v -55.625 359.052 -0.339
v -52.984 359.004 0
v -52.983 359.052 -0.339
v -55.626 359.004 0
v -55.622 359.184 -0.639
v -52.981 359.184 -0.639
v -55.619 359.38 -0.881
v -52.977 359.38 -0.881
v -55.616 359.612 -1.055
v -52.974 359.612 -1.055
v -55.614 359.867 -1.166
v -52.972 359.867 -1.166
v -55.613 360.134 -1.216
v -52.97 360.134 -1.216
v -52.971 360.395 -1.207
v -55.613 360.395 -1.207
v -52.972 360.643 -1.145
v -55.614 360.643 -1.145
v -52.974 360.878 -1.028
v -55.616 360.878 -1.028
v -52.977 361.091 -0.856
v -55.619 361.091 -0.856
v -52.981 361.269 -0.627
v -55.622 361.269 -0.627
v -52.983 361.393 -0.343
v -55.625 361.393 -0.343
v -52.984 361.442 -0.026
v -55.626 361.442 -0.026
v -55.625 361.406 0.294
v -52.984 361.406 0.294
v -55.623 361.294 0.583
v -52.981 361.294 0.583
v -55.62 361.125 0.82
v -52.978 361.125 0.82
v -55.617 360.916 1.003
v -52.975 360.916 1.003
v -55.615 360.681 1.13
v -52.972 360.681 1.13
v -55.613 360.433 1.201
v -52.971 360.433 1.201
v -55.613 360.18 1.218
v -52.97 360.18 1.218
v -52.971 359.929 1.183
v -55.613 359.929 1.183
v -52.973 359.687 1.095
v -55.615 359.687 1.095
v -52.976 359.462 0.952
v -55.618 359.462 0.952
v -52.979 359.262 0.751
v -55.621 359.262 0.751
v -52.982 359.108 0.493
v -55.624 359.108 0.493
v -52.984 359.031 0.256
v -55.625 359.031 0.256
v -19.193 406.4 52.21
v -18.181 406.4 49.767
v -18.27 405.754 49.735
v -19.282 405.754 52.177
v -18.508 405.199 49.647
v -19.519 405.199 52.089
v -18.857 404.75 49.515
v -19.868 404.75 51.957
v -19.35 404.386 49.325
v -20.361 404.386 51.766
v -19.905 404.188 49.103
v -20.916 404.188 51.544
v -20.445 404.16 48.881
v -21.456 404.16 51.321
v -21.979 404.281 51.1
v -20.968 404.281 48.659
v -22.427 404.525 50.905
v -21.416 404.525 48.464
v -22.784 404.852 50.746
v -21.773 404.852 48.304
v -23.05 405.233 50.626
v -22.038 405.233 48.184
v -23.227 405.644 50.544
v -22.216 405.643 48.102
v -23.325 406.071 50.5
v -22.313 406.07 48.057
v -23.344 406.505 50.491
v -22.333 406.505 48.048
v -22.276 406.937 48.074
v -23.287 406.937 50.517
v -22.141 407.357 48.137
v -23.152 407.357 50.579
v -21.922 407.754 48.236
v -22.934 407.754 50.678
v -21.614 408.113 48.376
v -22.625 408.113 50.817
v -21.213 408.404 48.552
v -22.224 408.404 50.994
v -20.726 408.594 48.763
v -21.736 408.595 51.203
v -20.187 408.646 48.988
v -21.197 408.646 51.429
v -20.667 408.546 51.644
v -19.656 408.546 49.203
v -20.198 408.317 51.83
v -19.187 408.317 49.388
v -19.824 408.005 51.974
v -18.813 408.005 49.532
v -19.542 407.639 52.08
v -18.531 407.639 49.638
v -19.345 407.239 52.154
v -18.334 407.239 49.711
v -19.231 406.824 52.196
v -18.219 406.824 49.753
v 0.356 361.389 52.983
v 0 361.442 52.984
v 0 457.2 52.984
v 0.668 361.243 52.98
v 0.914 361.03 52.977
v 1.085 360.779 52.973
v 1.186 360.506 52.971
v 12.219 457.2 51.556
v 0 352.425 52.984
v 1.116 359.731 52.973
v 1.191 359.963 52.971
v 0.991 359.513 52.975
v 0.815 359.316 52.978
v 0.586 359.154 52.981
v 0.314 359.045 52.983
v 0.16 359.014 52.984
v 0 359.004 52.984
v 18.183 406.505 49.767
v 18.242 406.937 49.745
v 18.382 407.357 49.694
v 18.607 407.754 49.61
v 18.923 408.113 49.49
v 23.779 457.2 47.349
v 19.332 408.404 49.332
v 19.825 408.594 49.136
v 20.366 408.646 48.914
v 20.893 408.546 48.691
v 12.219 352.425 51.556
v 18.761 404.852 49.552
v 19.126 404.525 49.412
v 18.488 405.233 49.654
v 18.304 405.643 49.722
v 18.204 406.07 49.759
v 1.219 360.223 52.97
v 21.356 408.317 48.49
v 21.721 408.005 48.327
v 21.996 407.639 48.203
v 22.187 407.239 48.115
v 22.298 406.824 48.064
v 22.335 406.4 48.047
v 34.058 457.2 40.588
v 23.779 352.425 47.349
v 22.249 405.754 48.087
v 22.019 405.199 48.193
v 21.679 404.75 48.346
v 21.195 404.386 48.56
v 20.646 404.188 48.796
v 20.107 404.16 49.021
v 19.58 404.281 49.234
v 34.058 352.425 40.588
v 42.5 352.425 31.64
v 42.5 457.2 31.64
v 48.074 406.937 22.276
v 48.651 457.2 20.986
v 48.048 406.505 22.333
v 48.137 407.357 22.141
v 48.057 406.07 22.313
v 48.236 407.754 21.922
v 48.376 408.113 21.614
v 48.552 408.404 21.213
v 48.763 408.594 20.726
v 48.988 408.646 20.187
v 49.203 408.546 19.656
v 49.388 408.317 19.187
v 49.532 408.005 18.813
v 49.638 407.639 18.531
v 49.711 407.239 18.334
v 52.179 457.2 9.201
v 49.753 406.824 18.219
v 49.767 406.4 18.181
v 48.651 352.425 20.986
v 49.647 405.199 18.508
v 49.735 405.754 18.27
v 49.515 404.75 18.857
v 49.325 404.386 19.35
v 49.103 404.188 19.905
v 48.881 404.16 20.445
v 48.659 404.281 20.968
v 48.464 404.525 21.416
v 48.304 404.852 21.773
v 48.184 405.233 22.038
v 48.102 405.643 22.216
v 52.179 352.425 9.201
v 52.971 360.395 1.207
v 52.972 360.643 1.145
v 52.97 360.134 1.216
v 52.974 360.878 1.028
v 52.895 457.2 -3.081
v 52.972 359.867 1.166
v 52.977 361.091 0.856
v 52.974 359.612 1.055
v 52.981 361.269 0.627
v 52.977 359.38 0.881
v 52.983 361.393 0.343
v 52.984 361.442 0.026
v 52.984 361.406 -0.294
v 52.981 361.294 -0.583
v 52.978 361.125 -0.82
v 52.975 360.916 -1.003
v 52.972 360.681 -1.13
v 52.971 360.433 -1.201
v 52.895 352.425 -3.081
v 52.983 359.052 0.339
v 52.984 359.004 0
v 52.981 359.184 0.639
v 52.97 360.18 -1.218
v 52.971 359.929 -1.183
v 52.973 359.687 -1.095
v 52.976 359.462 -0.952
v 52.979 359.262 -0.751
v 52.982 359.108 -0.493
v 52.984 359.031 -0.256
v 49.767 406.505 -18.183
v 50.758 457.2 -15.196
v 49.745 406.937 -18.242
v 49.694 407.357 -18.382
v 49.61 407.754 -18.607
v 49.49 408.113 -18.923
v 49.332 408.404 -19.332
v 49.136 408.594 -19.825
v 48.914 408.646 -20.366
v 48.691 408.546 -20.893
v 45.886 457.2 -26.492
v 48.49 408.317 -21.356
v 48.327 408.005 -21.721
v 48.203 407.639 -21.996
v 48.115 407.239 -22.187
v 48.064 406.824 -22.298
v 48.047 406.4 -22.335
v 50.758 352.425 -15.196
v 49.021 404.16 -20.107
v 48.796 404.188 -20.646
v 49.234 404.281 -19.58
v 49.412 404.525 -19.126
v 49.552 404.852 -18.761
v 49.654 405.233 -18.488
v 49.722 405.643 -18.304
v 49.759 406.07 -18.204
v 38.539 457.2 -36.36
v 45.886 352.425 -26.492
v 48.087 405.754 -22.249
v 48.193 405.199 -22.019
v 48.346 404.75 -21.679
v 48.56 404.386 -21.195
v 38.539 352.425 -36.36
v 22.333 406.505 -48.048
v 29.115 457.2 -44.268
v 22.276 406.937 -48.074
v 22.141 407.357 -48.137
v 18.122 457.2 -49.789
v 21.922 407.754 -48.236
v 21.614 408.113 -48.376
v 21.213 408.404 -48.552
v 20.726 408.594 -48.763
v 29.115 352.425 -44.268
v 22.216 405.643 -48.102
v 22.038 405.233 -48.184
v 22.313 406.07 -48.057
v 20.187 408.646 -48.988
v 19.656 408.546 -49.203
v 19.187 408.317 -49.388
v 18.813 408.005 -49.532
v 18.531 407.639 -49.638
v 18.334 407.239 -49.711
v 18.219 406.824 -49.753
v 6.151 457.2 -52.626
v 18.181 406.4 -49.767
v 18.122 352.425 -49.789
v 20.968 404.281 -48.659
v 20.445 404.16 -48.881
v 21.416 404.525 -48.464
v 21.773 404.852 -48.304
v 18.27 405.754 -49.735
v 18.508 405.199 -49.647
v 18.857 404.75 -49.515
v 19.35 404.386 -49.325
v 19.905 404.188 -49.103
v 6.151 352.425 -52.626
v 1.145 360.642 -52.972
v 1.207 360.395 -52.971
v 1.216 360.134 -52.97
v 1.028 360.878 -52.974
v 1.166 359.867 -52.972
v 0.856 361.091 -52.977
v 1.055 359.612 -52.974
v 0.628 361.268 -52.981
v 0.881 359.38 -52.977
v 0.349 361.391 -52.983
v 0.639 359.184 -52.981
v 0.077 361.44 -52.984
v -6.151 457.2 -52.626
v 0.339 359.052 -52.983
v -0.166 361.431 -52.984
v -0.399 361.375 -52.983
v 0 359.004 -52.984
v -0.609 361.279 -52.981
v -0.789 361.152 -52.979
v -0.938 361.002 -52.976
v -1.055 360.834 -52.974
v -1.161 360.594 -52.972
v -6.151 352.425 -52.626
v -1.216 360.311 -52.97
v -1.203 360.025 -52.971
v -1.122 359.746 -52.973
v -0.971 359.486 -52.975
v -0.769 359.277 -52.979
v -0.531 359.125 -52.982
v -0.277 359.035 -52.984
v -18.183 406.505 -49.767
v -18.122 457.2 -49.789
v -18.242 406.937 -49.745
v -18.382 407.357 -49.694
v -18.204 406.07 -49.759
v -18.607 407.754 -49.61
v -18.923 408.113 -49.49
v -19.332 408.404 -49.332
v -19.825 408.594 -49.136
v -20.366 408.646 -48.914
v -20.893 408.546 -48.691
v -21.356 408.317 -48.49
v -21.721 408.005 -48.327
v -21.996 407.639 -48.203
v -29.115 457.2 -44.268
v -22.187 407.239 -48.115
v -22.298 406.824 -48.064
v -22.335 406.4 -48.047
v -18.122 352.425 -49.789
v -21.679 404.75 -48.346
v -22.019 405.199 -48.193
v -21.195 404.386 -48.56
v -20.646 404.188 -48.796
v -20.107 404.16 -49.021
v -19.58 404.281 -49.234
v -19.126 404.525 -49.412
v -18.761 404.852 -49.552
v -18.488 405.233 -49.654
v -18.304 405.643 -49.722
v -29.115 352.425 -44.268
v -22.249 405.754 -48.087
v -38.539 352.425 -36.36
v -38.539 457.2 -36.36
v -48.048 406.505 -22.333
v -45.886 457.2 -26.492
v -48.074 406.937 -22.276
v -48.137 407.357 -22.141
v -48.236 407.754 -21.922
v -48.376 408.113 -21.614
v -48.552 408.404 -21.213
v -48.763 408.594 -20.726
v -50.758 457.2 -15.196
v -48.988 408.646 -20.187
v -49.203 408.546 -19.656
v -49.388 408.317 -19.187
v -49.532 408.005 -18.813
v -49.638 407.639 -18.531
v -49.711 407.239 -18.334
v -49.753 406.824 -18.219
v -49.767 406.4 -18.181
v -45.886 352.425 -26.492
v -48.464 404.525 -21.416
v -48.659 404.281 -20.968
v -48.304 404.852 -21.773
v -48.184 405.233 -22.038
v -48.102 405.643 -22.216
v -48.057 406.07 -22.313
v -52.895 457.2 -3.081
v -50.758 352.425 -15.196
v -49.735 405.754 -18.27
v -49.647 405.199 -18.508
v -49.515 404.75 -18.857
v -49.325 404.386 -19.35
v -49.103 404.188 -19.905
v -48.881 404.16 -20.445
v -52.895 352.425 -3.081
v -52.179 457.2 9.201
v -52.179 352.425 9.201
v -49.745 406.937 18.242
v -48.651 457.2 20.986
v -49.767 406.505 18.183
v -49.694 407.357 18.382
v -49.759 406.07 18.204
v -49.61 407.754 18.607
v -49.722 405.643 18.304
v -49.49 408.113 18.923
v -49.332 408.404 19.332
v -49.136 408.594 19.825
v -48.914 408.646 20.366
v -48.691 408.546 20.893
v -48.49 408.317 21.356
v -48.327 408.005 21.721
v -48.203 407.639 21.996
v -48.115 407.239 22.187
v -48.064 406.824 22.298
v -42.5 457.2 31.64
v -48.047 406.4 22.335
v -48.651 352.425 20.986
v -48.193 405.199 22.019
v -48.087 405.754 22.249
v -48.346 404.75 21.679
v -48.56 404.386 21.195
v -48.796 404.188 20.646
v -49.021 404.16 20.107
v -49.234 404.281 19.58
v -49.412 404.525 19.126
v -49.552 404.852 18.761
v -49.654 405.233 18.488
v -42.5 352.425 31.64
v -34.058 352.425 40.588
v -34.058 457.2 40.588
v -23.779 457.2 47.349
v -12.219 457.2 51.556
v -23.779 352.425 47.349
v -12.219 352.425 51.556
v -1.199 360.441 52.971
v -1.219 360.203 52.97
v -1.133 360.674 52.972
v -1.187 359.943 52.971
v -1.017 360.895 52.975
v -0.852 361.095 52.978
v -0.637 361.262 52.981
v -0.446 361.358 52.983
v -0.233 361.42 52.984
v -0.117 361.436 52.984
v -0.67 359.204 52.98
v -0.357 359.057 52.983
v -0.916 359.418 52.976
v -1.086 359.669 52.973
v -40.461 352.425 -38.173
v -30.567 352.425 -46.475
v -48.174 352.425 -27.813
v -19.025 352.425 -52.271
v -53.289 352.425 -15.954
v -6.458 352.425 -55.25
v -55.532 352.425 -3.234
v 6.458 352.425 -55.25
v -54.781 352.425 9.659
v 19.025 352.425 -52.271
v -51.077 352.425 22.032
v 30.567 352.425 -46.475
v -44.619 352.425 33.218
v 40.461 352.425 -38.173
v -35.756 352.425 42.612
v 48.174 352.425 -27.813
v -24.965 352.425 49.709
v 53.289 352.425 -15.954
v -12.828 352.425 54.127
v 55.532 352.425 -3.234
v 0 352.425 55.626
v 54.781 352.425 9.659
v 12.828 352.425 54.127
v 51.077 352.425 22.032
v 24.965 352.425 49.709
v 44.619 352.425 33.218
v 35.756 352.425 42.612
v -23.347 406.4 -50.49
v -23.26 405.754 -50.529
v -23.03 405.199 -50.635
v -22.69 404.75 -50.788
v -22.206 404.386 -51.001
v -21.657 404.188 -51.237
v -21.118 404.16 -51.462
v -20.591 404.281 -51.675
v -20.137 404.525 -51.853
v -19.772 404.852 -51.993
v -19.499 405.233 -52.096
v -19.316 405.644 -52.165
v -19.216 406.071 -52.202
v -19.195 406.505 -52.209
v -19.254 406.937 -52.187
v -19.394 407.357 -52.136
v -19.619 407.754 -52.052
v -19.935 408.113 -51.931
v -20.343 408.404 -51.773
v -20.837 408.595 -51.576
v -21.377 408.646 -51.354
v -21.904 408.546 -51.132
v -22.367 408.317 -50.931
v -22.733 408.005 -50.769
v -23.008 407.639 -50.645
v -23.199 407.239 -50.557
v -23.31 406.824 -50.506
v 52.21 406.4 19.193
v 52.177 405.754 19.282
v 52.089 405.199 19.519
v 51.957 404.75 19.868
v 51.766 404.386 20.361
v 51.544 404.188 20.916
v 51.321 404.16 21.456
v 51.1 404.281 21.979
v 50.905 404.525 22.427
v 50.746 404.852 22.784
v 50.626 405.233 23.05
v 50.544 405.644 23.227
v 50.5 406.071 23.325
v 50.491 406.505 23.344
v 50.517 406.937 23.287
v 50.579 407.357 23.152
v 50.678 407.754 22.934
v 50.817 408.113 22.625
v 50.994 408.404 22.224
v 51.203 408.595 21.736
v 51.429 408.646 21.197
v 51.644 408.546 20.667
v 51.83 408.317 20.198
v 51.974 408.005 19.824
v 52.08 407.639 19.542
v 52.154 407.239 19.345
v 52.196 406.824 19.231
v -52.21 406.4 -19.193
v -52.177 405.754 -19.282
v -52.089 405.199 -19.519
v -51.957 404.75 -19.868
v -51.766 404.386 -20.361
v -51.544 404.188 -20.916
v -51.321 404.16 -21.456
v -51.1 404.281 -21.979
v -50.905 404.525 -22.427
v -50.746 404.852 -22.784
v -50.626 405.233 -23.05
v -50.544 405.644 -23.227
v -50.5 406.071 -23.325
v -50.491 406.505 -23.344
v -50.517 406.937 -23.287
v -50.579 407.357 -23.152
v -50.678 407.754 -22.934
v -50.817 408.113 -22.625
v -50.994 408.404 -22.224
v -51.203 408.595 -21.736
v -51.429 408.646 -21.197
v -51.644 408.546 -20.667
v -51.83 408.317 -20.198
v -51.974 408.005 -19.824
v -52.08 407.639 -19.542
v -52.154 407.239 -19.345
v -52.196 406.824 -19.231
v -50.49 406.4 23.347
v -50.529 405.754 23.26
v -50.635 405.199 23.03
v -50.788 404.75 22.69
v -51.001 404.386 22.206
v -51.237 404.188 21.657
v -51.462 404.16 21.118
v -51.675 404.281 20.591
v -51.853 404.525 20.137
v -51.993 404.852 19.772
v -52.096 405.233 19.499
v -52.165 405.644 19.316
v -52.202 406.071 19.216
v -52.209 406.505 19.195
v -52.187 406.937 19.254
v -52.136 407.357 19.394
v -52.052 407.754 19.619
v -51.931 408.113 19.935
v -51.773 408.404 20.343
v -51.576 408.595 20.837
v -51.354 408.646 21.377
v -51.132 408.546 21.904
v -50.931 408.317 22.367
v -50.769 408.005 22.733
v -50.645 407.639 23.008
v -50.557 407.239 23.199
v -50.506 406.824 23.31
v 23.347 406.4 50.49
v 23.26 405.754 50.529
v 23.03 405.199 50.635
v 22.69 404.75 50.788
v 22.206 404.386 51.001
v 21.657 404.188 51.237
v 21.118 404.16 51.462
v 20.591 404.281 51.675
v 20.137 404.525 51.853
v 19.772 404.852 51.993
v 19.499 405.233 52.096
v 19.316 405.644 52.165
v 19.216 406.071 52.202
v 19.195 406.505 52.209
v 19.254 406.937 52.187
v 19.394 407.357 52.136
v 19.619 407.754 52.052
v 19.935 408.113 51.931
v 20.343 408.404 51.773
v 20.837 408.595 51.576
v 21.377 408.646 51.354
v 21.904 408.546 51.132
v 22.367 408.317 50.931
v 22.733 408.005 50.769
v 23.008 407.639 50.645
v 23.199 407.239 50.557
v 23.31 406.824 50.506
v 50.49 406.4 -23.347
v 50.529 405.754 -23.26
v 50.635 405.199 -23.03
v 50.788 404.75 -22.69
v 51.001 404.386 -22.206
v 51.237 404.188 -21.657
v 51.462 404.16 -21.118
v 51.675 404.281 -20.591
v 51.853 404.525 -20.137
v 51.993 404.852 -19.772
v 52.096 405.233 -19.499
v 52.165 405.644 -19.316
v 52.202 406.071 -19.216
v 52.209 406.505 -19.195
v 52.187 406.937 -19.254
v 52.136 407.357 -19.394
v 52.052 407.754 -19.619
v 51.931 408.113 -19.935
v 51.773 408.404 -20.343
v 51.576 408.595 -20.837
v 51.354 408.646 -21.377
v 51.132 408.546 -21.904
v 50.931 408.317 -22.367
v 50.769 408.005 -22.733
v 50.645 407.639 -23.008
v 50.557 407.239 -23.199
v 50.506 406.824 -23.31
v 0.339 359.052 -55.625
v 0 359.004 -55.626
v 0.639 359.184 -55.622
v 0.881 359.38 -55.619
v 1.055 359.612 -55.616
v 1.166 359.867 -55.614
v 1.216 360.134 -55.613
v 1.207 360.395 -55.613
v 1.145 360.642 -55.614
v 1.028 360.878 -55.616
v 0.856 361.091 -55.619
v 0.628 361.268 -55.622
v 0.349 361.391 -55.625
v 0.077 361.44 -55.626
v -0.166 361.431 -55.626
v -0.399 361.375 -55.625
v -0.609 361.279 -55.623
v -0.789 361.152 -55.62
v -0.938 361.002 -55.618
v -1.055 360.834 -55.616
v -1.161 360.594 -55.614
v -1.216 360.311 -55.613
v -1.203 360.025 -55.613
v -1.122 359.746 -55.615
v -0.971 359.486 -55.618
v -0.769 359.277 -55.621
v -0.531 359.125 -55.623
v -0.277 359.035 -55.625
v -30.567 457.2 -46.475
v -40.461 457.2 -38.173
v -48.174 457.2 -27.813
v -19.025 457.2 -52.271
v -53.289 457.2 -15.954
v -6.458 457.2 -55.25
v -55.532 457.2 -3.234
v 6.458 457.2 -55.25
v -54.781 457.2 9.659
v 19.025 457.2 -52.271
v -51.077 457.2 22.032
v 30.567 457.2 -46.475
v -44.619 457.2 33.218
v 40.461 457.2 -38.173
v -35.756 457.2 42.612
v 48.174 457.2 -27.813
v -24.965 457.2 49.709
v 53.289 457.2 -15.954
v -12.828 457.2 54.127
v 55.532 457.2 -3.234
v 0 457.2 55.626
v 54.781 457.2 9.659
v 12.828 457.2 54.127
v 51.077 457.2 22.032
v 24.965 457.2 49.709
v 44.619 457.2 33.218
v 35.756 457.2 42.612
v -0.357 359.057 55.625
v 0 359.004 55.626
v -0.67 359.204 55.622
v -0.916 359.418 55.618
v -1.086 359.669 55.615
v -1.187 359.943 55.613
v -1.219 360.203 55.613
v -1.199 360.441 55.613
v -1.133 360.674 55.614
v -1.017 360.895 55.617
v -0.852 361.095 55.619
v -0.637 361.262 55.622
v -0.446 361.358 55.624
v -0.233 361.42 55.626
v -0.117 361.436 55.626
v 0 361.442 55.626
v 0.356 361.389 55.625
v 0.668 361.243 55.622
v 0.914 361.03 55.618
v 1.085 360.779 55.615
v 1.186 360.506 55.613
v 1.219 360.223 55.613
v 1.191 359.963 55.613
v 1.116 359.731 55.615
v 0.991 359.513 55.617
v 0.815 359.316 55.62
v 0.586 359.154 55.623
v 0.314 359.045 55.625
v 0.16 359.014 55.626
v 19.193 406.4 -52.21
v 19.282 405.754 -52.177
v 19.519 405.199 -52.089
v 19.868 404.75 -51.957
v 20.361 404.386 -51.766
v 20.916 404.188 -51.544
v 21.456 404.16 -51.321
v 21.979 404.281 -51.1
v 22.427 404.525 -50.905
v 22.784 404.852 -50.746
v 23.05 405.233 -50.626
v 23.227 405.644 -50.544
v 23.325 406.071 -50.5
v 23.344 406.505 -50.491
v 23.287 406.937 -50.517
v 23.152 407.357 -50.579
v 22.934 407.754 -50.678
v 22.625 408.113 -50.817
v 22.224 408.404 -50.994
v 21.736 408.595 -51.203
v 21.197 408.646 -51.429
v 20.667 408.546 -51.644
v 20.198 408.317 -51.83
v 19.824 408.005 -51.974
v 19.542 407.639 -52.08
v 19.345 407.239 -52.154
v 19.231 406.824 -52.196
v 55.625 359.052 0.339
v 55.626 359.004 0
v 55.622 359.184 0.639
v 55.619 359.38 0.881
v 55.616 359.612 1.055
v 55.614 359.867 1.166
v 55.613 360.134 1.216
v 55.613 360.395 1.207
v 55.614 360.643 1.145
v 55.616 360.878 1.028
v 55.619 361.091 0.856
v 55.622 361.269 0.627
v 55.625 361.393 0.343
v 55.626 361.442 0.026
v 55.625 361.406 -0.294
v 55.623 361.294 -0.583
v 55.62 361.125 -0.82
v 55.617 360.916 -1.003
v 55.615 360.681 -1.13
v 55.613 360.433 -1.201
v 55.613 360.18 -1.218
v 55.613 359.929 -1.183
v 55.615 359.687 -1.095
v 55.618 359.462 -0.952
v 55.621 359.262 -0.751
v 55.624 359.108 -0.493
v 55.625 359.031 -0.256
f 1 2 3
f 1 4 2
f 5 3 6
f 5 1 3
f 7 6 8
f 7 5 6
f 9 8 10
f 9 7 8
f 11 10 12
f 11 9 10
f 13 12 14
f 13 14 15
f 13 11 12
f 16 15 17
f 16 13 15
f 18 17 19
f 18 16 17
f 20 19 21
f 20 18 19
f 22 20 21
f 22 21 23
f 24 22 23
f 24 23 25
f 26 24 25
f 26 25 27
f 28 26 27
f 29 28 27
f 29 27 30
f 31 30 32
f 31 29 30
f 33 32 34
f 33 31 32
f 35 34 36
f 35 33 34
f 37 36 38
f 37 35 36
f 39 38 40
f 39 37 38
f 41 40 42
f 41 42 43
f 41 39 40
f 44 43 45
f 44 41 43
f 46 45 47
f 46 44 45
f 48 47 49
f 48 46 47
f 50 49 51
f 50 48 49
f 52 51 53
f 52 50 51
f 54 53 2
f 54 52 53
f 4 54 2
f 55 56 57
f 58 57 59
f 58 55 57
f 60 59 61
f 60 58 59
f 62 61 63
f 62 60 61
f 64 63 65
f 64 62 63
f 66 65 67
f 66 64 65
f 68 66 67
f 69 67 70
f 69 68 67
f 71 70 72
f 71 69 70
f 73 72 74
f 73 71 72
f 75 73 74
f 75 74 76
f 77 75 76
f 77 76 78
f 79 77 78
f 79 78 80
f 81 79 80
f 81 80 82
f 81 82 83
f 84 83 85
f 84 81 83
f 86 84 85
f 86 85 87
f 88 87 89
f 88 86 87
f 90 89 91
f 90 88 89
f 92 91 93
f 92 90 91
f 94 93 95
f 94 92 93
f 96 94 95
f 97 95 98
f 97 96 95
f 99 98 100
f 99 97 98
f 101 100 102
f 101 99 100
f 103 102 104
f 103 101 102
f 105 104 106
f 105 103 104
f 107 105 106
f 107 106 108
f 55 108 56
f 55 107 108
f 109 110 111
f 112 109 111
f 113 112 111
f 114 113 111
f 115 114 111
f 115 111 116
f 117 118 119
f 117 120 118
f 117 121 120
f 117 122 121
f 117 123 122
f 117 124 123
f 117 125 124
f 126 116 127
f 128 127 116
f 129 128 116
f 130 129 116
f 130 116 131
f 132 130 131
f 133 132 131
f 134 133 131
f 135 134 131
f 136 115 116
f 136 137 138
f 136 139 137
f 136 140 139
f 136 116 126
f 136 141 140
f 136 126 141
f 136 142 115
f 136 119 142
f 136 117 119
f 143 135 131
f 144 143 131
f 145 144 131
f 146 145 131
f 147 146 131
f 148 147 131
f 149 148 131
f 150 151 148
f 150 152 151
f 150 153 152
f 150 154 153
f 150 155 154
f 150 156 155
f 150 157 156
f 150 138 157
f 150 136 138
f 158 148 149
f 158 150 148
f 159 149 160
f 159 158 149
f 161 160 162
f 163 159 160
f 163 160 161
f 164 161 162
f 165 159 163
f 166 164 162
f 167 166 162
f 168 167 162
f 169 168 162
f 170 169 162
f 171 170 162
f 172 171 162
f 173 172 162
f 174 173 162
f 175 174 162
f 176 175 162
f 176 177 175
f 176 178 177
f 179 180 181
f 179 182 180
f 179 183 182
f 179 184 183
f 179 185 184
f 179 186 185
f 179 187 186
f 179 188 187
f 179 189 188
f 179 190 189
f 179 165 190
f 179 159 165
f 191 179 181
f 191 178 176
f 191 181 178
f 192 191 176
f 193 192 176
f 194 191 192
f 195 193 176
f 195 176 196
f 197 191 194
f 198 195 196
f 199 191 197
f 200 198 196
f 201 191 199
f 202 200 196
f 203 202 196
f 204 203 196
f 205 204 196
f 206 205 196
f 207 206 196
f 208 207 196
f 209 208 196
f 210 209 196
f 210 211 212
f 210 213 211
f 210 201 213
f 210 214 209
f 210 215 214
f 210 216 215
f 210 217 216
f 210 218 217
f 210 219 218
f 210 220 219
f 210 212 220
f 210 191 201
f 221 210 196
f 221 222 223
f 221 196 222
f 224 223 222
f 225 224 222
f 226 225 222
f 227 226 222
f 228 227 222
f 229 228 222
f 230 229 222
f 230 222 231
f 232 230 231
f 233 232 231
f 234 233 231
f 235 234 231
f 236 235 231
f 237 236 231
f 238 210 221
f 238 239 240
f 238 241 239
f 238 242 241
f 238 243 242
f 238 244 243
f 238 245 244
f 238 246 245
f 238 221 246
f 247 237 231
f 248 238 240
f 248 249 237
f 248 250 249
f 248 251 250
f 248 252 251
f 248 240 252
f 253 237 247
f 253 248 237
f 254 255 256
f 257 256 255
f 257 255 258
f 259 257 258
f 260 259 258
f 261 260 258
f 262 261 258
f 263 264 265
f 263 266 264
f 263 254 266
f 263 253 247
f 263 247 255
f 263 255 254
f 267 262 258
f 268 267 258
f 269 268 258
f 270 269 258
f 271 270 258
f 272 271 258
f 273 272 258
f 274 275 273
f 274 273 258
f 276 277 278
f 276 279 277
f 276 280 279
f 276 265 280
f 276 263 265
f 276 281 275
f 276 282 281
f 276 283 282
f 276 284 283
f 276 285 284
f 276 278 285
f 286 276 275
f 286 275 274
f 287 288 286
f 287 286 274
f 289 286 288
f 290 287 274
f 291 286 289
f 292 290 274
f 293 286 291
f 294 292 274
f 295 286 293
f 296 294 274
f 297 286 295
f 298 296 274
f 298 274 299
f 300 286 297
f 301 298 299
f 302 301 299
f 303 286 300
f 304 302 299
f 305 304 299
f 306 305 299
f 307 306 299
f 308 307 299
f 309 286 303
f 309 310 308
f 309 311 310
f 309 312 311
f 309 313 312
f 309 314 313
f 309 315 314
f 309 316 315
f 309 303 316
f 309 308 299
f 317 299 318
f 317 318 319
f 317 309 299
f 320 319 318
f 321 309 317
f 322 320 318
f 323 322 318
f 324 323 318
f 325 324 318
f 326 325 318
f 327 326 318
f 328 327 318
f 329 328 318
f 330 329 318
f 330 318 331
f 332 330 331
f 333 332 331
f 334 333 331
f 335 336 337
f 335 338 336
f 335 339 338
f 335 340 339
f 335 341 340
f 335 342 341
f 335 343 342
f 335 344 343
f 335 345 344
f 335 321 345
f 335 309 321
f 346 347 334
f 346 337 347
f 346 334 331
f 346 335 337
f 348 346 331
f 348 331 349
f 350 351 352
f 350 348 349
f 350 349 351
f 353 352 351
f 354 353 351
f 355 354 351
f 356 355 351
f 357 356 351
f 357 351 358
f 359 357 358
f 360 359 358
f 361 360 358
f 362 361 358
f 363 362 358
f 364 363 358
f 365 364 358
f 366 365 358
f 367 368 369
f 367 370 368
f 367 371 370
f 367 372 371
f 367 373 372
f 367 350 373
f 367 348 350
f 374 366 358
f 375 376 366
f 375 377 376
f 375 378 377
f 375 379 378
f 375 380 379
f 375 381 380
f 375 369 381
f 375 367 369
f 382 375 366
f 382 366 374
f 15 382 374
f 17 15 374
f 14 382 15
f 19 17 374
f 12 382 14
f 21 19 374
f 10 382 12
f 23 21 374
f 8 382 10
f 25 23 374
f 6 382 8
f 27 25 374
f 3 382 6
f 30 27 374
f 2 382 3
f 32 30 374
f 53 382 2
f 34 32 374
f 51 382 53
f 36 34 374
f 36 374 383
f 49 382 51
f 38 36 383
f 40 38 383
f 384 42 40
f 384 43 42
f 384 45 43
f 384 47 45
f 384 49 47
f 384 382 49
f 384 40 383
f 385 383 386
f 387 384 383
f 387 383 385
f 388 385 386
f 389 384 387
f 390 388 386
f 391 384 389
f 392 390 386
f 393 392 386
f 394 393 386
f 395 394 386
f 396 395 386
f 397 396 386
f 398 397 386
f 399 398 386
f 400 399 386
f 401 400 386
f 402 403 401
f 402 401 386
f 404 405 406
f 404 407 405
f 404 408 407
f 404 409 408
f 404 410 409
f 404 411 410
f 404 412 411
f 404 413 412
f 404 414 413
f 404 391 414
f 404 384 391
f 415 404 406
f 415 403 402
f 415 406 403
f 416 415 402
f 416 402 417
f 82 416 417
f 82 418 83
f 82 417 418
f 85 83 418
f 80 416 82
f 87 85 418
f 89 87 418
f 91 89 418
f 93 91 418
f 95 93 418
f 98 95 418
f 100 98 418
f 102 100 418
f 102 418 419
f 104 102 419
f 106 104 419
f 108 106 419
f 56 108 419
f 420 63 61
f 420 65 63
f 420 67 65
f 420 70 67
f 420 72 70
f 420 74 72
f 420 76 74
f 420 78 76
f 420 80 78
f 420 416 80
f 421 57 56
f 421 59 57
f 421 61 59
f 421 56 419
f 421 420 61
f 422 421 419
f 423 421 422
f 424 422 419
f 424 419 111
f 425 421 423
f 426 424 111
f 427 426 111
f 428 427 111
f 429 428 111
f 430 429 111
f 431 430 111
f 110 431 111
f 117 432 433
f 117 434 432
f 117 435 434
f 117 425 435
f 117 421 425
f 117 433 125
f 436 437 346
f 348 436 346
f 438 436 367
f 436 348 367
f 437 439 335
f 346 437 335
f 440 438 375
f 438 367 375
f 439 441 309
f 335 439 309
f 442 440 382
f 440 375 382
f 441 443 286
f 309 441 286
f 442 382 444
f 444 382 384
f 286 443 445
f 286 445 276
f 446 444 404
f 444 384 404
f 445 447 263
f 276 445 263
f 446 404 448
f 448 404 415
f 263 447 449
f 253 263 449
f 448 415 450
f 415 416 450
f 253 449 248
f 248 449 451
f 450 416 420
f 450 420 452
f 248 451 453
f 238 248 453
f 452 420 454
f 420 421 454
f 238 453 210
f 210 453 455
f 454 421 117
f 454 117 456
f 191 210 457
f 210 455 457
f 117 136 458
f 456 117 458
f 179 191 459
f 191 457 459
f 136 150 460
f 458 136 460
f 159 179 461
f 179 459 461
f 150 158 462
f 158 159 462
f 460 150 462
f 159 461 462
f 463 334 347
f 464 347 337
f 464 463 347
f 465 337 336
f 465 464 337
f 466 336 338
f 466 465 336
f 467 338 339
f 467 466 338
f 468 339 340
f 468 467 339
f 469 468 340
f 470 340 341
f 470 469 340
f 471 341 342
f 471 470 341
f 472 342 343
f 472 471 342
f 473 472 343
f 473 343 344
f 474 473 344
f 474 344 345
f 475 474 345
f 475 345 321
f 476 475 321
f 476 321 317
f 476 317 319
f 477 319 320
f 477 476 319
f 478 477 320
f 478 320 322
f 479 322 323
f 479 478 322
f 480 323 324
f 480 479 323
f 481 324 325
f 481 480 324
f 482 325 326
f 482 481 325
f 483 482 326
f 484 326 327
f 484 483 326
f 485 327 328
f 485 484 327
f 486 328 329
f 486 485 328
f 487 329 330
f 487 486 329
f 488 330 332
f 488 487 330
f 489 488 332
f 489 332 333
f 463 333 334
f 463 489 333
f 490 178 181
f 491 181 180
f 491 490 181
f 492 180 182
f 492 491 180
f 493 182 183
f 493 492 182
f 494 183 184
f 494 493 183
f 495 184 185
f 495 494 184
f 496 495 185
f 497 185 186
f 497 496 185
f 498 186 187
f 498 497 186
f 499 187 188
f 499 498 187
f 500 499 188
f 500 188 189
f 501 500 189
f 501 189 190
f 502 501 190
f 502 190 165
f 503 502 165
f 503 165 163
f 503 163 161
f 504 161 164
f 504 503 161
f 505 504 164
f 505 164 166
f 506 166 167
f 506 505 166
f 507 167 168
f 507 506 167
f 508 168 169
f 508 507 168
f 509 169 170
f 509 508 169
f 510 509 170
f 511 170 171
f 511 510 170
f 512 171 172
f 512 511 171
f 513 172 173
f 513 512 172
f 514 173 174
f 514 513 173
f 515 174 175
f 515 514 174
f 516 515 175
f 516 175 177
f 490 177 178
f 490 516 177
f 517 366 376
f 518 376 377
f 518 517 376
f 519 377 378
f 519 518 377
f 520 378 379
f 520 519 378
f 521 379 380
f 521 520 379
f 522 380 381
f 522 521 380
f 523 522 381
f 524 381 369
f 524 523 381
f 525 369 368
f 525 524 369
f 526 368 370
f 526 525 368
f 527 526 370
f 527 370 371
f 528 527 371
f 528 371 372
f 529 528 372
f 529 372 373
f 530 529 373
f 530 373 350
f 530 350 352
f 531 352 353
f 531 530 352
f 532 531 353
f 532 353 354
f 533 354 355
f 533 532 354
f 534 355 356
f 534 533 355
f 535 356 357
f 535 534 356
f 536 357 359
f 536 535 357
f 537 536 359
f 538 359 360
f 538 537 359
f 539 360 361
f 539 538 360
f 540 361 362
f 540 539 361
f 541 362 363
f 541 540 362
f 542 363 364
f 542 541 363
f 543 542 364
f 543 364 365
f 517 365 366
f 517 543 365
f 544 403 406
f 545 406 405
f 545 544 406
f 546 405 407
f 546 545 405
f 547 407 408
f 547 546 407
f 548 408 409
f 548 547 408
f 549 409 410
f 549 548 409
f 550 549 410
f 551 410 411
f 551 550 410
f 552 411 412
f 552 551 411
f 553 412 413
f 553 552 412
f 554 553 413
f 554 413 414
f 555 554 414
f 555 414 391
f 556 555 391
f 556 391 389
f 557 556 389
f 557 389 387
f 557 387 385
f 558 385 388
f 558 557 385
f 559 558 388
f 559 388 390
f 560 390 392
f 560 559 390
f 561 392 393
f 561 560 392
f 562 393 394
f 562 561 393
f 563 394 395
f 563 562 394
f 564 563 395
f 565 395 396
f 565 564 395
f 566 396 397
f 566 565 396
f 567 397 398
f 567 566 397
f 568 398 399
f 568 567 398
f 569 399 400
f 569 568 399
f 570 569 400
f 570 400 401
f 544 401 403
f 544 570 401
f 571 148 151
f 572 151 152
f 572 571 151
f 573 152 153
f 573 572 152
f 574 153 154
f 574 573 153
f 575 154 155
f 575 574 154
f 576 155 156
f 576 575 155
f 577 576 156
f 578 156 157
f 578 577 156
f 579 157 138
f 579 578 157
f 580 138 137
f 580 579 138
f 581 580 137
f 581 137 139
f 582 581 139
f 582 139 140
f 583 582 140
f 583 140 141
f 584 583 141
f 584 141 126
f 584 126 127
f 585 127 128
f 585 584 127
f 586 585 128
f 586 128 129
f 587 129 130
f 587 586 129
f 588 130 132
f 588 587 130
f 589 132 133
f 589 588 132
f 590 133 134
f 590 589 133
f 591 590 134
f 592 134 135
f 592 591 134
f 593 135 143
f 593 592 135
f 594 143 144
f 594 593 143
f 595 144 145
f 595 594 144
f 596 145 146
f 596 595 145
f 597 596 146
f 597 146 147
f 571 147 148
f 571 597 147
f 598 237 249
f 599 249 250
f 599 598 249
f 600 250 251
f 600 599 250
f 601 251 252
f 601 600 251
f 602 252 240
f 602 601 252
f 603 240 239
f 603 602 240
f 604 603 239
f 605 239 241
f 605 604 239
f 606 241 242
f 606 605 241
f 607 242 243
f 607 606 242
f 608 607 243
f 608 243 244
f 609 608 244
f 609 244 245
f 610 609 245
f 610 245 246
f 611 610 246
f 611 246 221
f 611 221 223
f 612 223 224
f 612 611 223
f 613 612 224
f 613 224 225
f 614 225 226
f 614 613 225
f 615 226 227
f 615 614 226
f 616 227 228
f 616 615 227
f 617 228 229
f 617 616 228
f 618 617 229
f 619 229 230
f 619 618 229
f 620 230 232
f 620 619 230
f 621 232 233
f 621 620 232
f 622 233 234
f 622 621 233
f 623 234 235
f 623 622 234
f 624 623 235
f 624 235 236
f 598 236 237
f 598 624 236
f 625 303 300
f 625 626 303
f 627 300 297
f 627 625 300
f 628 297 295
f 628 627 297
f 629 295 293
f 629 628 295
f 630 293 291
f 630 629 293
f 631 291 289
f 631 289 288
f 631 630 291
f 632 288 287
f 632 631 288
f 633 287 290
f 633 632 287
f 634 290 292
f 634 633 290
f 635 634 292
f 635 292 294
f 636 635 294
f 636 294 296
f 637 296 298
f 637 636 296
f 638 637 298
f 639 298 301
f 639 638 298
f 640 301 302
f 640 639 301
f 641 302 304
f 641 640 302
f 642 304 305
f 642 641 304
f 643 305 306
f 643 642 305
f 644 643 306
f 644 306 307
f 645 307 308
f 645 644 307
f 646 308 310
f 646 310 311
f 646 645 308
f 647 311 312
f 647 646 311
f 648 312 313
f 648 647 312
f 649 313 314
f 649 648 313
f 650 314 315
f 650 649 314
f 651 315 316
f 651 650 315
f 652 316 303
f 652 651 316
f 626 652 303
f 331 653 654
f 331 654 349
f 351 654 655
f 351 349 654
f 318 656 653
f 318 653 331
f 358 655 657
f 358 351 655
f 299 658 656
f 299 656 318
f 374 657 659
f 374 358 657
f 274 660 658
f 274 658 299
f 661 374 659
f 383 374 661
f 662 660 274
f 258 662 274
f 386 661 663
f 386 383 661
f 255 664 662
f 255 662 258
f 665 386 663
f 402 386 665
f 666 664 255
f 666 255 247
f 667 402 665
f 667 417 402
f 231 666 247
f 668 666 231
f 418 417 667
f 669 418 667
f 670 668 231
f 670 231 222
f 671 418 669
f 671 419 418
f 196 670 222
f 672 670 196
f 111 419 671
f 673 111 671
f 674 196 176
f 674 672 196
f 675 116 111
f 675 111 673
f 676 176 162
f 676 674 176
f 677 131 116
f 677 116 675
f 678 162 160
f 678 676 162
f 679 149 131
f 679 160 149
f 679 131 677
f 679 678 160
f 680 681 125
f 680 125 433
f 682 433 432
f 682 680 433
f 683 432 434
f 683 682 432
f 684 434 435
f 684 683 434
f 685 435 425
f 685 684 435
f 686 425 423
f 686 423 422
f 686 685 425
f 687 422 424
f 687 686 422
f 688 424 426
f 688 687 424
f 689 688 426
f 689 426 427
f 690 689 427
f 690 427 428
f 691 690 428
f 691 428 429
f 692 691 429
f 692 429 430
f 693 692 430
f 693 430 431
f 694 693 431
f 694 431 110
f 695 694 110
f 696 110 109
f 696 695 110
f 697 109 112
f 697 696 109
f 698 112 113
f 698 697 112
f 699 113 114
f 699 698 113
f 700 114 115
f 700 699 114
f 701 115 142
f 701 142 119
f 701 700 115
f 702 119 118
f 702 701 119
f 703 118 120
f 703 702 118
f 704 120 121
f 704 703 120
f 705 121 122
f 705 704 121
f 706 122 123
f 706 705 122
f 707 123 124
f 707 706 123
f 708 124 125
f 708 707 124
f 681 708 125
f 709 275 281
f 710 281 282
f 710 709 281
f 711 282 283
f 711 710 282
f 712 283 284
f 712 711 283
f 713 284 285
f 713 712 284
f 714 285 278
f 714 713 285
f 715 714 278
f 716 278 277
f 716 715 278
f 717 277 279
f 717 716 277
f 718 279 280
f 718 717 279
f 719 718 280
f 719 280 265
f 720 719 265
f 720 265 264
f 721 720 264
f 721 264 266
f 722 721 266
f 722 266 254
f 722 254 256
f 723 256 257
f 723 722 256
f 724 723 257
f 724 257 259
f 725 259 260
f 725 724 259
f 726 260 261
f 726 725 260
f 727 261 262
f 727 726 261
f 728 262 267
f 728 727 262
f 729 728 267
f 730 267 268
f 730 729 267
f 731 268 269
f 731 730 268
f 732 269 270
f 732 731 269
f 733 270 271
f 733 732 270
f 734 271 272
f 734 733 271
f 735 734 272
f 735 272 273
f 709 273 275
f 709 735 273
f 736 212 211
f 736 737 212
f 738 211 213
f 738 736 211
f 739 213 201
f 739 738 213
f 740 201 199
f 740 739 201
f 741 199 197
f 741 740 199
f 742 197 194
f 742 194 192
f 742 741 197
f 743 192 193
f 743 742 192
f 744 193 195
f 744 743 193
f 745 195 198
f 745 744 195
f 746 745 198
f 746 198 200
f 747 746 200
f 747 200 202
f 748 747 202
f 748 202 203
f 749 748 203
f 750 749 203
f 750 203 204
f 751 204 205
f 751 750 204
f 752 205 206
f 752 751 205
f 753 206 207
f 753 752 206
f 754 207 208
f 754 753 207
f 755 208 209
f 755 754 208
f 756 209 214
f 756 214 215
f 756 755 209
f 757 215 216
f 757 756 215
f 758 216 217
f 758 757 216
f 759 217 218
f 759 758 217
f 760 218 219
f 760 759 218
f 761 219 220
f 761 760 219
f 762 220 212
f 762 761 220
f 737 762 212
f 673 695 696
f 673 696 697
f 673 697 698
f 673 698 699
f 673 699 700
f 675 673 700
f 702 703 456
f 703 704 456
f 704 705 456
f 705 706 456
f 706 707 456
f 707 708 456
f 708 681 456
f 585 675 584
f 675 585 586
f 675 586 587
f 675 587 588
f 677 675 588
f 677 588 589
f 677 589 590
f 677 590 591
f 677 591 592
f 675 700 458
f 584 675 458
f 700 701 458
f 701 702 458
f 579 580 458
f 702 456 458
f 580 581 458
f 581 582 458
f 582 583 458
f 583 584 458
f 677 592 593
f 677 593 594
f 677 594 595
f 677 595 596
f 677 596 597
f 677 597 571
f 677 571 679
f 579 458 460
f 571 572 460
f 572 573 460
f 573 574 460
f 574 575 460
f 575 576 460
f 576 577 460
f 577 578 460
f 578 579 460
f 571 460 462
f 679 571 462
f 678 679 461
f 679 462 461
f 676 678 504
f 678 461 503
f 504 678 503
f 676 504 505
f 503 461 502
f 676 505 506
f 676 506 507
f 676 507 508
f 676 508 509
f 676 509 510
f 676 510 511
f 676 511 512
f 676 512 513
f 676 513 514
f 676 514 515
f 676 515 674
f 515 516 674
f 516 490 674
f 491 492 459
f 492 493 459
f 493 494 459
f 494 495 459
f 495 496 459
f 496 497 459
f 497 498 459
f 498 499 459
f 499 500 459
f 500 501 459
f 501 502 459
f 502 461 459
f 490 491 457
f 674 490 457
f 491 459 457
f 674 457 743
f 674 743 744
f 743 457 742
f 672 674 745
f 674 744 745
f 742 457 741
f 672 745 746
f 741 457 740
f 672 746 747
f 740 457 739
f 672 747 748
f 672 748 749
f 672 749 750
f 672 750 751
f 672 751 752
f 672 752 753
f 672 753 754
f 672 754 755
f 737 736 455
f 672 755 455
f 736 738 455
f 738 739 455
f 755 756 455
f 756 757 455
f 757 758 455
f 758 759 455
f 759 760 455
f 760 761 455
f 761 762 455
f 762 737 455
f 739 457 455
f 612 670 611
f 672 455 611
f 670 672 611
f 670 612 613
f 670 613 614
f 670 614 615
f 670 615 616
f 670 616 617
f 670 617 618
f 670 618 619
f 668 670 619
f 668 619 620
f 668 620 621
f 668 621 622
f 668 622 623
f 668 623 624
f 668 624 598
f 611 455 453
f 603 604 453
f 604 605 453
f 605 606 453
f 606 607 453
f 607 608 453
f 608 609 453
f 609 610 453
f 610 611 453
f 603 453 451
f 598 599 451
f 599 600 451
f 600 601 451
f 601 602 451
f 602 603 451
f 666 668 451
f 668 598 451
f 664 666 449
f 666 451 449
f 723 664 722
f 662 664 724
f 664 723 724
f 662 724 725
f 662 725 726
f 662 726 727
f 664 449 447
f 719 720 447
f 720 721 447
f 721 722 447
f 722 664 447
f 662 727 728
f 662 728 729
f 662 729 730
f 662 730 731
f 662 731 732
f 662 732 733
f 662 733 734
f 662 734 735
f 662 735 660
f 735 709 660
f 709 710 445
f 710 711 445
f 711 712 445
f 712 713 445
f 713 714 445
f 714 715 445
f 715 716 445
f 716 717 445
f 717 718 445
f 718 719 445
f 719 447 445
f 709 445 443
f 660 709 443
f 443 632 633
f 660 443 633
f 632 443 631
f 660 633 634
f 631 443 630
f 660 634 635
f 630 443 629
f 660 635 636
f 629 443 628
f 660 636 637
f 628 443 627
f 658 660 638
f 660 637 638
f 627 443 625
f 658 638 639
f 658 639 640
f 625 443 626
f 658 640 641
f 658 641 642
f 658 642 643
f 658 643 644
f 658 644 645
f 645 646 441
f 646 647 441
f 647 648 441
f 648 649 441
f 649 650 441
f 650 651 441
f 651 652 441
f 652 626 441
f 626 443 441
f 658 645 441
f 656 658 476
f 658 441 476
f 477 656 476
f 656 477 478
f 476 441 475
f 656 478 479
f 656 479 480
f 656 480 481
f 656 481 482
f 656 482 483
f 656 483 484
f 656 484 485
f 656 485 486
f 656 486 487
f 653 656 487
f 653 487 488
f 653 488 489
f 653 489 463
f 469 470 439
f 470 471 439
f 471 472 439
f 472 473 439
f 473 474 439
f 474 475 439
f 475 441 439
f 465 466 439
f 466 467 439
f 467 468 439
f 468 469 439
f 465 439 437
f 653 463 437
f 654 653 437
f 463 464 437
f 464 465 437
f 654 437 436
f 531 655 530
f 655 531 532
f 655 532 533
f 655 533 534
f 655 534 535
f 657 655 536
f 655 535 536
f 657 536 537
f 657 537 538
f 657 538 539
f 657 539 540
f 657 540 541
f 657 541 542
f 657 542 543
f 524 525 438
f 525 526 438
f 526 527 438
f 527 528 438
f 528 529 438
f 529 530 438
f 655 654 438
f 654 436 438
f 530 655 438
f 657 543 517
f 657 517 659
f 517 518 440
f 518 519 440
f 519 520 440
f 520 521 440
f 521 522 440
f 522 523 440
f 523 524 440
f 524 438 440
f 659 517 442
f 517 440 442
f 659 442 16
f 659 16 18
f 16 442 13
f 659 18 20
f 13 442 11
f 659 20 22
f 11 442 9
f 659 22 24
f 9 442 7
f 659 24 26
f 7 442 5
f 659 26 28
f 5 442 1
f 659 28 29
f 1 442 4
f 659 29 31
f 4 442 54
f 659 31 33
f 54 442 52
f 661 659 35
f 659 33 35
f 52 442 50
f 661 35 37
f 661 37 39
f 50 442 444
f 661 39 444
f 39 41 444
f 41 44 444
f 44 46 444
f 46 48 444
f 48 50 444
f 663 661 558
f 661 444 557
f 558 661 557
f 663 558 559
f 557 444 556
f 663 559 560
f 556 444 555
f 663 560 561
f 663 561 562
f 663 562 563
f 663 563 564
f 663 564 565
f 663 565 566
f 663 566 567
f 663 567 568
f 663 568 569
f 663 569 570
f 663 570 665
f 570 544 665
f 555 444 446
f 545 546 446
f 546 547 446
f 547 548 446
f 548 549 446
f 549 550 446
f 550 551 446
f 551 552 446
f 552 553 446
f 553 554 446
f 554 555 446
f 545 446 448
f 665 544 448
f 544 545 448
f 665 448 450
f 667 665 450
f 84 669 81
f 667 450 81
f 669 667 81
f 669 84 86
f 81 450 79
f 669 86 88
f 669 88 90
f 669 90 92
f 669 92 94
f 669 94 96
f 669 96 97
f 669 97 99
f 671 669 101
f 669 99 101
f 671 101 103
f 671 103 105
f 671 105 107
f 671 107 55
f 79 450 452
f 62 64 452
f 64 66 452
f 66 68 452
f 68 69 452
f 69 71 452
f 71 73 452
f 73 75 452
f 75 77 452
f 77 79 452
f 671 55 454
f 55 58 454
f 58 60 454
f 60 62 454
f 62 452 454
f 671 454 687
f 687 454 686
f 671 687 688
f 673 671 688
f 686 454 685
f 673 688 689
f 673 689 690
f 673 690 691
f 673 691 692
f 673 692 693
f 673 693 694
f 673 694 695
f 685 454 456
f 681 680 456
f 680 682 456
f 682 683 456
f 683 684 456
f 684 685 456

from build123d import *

# Parameters (mm, degrees)
BOSS_EXTRUDE1_START = 352.425
SKETCH1_R           = 55.626
SKETCH1_R_2         = 52.9844
BOSS_EXTRUDE1_DEPTH = 104.775
CIRPATTERN1_COUNT   = 4
CIRPATTERN2_COUNT   = 8


with BuildPart() as part:
    # Sketch1 → Boss-Extrude1 (new body)
    with BuildSketch(Plane(origin=(0, 0, 0), x_dir=(1, 0, 0), z_dir=(0, 1, 0)).offset(BOSS_EXTRUDE1_START)):
        with Locations(Location((0, 0, 0), (0, 0, 270))):
            Circle(SKETCH1_R)
        with Locations(Location((0, 0, 0), (0, 0, 270))):
            Circle(SKETCH1_R_2, mode=Mode.SUBTRACT)
    extrude(amount=BOSS_EXTRUDE1_DEPTH)

    # Sketch4 → #2 Clearance Hole1 (revolve, cut)
    with BuildSketch(Plane(origin=(0, 360.2228, 55.626), x_dir=(0, -1, 0), z_dir=(1, 0, 0))):
        Polygon((0, 0), (0, 55.596569267), (1.2192, 54.864), (1.2192, 0), align=None)
    f_2_clearance_hole1 = revolve(axis=Axis((0, 360.2228, 61.976), (0, 0, -1)), mode=Mode.SUBTRACT)

    # Sketch6 → #8 Clearance Hole1 (revolve, cut)
    with BuildSketch(Plane(origin=(21.287148609, 406.4, 51.391722875), x_dir=(0.9238795325112864, 0, -0.38268343236509056), z_dir=(0, 1, 0))):
        Polygon((0, 0), (0, 56.214674586), (2.2479, 54.864), (2.2479, 0), align=None)
    f_8_clearance_hole1 = revolve(axis=Axis((23.717188404, 406.4, 57.258357907), (-0.38268343236509056, 0, -0.9238795325112865)), mode=Mode.SUBTRACT)

    # CirPattern1: #2 Clearance Hole1 ×4 about axis
    cirpattern1_axis = Axis((0, 457.2, 0), (0, -1, 0))
    for i in range(1, CIRPATTERN1_COUNT):
        add(f_2_clearance_hole1.rotate(cirpattern1_axis, i * 360 / CIRPATTERN1_COUNT), mode=Mode.SUBTRACT)

    # CirPattern2: #8 Clearance Hole1 ×8 about axis
    cirpattern2_axis = Axis((0, 457.2, 0), (0, -1, 0))
    for i in range(1, CIRPATTERN2_COUNT):
        add(f_8_clearance_hole1.rotate(cirpattern2_axis, i * 360 / CIRPATTERN2_COUNT), mode=Mode.SUBTRACT)


solid = part.part
